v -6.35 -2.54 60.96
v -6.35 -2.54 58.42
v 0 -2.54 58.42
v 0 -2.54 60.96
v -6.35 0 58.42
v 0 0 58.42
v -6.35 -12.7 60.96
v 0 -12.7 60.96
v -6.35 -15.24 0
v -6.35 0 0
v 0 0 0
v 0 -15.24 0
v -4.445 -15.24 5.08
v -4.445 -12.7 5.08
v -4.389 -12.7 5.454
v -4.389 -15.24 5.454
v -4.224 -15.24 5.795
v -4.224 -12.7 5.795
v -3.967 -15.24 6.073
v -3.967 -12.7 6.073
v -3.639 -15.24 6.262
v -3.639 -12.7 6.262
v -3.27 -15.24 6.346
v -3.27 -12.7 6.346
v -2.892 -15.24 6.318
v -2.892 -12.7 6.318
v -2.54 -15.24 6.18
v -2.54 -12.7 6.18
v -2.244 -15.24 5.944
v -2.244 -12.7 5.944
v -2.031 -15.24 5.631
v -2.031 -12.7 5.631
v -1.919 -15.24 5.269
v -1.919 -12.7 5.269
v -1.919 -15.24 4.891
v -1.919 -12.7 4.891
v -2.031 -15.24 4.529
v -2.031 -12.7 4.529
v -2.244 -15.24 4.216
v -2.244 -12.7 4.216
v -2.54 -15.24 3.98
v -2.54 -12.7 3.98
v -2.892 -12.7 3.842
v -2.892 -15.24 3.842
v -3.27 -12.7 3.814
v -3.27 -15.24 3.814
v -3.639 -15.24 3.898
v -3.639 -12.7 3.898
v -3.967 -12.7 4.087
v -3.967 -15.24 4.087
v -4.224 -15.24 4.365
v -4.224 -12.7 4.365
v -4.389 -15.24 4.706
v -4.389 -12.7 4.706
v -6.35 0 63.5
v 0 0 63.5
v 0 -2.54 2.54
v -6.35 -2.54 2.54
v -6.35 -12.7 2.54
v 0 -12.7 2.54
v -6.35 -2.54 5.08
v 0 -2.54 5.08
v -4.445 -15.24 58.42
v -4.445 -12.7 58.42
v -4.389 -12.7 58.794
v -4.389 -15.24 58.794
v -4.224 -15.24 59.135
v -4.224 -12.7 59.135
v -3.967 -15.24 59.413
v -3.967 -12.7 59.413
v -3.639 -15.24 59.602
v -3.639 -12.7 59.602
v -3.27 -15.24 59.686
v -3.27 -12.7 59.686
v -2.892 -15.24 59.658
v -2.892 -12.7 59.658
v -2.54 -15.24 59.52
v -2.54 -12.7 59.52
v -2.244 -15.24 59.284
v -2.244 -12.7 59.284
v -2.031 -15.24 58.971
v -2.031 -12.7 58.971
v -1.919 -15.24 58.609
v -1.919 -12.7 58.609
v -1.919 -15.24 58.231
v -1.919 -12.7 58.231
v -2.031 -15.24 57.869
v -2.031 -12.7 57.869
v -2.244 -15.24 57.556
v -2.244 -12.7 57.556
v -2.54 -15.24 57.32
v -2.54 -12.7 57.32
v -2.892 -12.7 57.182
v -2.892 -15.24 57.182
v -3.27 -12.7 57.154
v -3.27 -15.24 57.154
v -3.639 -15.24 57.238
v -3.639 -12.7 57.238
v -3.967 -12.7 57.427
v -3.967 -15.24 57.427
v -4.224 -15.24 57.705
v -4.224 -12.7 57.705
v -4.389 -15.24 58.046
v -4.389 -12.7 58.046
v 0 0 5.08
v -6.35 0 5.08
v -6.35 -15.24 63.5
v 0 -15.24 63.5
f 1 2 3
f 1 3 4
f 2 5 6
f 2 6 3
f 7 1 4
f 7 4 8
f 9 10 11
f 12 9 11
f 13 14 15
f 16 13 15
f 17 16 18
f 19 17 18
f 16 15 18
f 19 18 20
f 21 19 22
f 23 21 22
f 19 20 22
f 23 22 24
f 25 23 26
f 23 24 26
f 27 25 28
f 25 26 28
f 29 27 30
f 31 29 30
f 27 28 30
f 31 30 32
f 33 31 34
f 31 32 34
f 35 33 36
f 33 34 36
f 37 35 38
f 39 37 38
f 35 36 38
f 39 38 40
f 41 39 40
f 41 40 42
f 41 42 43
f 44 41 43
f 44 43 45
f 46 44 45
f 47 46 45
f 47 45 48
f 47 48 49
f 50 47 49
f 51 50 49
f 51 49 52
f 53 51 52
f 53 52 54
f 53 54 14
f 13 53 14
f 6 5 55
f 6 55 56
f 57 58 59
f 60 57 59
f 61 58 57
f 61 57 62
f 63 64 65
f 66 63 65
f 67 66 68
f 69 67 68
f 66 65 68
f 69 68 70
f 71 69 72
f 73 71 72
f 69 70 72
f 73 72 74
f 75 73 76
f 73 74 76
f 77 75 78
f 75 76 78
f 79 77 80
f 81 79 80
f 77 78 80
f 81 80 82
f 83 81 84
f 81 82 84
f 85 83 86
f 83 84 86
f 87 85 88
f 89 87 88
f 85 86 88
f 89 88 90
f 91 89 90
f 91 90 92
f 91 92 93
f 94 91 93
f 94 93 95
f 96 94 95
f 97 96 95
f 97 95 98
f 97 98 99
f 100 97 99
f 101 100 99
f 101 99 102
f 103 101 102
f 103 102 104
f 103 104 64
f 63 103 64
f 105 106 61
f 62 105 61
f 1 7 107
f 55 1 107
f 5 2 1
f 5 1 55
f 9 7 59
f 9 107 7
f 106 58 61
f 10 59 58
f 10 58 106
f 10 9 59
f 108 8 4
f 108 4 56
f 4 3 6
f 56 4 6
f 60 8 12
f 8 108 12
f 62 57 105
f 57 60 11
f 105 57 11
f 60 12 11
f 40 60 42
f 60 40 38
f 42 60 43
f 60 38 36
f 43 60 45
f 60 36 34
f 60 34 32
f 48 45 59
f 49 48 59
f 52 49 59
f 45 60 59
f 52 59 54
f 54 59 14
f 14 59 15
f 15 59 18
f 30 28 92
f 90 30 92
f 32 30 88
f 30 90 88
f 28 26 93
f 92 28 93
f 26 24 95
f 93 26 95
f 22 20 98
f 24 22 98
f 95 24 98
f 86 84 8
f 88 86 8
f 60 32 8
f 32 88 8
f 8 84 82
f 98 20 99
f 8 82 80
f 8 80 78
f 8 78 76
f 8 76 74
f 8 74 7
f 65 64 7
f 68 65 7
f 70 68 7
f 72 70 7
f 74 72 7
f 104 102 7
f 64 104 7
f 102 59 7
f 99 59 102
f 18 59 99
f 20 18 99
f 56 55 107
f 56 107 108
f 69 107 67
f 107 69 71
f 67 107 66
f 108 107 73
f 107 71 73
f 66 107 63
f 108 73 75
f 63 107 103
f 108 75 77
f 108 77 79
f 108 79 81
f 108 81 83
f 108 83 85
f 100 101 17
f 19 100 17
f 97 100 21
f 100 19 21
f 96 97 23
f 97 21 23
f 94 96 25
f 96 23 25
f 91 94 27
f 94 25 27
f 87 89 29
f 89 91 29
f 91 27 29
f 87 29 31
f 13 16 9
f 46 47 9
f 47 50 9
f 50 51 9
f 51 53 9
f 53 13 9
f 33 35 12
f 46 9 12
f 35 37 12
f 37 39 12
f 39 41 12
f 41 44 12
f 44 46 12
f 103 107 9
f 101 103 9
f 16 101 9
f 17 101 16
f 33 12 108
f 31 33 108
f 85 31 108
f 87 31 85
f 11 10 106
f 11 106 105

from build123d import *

# Parameters (mm, degrees)
F0_W     = 6.35
F0_H     = 15.24
F1_DEPTH = 63.5
F2_W     = 10.16
F2_H     = 58.42
F3_DEPTH = 25.4
F4_W     = 5.08
F4_H     = 53.34
F5_DEPTH = 25.4
F6_R     = 1.27
F7_DEPTH = 25.4


with BuildPart() as f1:
    # F0 (on Top) → F1 (new body)
    with BuildSketch(Plane.XY):
        with Locations((-3.175, -7.62)):
            Rectangle(F0_W, F0_H)
    extrude(amount=F1_DEPTH)

    # F2 (on face) → F3 (cut)
    with BuildSketch(Plane(origin=(-6.35, 0, 0), x_dir=(0, -1, 0), z_dir=(-1, 0, 0))):
        with Locations((7.62, 31.75)):
            Rectangle(F2_W, F2_H)
    extrude(amount=-F3_DEPTH, mode=Mode.SUBTRACT)

    # F4 (on face) → F5 (cut)
    with BuildSketch(Plane(origin=(-6.35, 0, 0), x_dir=(0, -1, 0), z_dir=(-1, 0, 0))):
        with Locations((1.636012, 31.75)):
            Rectangle(F4_W, F4_H)
    extrude(amount=-F5_DEPTH, mode=Mode.SUBTRACT)

    # F6 (on face) → F7 (cut)
    with BuildSketch(Plane(origin=(0, -12.7, 0), x_dir=(-1, 0, 0), z_dir=(0, 1, 0))):
        with Locations((3.175, 5.08)):
            Circle(F6_R)
        with Locations((3.175, 58.42)):
            Circle(F6_R)
    extrude(amount=-F7_DEPTH, mode=Mode.SUBTRACT)


solid = f1.part
